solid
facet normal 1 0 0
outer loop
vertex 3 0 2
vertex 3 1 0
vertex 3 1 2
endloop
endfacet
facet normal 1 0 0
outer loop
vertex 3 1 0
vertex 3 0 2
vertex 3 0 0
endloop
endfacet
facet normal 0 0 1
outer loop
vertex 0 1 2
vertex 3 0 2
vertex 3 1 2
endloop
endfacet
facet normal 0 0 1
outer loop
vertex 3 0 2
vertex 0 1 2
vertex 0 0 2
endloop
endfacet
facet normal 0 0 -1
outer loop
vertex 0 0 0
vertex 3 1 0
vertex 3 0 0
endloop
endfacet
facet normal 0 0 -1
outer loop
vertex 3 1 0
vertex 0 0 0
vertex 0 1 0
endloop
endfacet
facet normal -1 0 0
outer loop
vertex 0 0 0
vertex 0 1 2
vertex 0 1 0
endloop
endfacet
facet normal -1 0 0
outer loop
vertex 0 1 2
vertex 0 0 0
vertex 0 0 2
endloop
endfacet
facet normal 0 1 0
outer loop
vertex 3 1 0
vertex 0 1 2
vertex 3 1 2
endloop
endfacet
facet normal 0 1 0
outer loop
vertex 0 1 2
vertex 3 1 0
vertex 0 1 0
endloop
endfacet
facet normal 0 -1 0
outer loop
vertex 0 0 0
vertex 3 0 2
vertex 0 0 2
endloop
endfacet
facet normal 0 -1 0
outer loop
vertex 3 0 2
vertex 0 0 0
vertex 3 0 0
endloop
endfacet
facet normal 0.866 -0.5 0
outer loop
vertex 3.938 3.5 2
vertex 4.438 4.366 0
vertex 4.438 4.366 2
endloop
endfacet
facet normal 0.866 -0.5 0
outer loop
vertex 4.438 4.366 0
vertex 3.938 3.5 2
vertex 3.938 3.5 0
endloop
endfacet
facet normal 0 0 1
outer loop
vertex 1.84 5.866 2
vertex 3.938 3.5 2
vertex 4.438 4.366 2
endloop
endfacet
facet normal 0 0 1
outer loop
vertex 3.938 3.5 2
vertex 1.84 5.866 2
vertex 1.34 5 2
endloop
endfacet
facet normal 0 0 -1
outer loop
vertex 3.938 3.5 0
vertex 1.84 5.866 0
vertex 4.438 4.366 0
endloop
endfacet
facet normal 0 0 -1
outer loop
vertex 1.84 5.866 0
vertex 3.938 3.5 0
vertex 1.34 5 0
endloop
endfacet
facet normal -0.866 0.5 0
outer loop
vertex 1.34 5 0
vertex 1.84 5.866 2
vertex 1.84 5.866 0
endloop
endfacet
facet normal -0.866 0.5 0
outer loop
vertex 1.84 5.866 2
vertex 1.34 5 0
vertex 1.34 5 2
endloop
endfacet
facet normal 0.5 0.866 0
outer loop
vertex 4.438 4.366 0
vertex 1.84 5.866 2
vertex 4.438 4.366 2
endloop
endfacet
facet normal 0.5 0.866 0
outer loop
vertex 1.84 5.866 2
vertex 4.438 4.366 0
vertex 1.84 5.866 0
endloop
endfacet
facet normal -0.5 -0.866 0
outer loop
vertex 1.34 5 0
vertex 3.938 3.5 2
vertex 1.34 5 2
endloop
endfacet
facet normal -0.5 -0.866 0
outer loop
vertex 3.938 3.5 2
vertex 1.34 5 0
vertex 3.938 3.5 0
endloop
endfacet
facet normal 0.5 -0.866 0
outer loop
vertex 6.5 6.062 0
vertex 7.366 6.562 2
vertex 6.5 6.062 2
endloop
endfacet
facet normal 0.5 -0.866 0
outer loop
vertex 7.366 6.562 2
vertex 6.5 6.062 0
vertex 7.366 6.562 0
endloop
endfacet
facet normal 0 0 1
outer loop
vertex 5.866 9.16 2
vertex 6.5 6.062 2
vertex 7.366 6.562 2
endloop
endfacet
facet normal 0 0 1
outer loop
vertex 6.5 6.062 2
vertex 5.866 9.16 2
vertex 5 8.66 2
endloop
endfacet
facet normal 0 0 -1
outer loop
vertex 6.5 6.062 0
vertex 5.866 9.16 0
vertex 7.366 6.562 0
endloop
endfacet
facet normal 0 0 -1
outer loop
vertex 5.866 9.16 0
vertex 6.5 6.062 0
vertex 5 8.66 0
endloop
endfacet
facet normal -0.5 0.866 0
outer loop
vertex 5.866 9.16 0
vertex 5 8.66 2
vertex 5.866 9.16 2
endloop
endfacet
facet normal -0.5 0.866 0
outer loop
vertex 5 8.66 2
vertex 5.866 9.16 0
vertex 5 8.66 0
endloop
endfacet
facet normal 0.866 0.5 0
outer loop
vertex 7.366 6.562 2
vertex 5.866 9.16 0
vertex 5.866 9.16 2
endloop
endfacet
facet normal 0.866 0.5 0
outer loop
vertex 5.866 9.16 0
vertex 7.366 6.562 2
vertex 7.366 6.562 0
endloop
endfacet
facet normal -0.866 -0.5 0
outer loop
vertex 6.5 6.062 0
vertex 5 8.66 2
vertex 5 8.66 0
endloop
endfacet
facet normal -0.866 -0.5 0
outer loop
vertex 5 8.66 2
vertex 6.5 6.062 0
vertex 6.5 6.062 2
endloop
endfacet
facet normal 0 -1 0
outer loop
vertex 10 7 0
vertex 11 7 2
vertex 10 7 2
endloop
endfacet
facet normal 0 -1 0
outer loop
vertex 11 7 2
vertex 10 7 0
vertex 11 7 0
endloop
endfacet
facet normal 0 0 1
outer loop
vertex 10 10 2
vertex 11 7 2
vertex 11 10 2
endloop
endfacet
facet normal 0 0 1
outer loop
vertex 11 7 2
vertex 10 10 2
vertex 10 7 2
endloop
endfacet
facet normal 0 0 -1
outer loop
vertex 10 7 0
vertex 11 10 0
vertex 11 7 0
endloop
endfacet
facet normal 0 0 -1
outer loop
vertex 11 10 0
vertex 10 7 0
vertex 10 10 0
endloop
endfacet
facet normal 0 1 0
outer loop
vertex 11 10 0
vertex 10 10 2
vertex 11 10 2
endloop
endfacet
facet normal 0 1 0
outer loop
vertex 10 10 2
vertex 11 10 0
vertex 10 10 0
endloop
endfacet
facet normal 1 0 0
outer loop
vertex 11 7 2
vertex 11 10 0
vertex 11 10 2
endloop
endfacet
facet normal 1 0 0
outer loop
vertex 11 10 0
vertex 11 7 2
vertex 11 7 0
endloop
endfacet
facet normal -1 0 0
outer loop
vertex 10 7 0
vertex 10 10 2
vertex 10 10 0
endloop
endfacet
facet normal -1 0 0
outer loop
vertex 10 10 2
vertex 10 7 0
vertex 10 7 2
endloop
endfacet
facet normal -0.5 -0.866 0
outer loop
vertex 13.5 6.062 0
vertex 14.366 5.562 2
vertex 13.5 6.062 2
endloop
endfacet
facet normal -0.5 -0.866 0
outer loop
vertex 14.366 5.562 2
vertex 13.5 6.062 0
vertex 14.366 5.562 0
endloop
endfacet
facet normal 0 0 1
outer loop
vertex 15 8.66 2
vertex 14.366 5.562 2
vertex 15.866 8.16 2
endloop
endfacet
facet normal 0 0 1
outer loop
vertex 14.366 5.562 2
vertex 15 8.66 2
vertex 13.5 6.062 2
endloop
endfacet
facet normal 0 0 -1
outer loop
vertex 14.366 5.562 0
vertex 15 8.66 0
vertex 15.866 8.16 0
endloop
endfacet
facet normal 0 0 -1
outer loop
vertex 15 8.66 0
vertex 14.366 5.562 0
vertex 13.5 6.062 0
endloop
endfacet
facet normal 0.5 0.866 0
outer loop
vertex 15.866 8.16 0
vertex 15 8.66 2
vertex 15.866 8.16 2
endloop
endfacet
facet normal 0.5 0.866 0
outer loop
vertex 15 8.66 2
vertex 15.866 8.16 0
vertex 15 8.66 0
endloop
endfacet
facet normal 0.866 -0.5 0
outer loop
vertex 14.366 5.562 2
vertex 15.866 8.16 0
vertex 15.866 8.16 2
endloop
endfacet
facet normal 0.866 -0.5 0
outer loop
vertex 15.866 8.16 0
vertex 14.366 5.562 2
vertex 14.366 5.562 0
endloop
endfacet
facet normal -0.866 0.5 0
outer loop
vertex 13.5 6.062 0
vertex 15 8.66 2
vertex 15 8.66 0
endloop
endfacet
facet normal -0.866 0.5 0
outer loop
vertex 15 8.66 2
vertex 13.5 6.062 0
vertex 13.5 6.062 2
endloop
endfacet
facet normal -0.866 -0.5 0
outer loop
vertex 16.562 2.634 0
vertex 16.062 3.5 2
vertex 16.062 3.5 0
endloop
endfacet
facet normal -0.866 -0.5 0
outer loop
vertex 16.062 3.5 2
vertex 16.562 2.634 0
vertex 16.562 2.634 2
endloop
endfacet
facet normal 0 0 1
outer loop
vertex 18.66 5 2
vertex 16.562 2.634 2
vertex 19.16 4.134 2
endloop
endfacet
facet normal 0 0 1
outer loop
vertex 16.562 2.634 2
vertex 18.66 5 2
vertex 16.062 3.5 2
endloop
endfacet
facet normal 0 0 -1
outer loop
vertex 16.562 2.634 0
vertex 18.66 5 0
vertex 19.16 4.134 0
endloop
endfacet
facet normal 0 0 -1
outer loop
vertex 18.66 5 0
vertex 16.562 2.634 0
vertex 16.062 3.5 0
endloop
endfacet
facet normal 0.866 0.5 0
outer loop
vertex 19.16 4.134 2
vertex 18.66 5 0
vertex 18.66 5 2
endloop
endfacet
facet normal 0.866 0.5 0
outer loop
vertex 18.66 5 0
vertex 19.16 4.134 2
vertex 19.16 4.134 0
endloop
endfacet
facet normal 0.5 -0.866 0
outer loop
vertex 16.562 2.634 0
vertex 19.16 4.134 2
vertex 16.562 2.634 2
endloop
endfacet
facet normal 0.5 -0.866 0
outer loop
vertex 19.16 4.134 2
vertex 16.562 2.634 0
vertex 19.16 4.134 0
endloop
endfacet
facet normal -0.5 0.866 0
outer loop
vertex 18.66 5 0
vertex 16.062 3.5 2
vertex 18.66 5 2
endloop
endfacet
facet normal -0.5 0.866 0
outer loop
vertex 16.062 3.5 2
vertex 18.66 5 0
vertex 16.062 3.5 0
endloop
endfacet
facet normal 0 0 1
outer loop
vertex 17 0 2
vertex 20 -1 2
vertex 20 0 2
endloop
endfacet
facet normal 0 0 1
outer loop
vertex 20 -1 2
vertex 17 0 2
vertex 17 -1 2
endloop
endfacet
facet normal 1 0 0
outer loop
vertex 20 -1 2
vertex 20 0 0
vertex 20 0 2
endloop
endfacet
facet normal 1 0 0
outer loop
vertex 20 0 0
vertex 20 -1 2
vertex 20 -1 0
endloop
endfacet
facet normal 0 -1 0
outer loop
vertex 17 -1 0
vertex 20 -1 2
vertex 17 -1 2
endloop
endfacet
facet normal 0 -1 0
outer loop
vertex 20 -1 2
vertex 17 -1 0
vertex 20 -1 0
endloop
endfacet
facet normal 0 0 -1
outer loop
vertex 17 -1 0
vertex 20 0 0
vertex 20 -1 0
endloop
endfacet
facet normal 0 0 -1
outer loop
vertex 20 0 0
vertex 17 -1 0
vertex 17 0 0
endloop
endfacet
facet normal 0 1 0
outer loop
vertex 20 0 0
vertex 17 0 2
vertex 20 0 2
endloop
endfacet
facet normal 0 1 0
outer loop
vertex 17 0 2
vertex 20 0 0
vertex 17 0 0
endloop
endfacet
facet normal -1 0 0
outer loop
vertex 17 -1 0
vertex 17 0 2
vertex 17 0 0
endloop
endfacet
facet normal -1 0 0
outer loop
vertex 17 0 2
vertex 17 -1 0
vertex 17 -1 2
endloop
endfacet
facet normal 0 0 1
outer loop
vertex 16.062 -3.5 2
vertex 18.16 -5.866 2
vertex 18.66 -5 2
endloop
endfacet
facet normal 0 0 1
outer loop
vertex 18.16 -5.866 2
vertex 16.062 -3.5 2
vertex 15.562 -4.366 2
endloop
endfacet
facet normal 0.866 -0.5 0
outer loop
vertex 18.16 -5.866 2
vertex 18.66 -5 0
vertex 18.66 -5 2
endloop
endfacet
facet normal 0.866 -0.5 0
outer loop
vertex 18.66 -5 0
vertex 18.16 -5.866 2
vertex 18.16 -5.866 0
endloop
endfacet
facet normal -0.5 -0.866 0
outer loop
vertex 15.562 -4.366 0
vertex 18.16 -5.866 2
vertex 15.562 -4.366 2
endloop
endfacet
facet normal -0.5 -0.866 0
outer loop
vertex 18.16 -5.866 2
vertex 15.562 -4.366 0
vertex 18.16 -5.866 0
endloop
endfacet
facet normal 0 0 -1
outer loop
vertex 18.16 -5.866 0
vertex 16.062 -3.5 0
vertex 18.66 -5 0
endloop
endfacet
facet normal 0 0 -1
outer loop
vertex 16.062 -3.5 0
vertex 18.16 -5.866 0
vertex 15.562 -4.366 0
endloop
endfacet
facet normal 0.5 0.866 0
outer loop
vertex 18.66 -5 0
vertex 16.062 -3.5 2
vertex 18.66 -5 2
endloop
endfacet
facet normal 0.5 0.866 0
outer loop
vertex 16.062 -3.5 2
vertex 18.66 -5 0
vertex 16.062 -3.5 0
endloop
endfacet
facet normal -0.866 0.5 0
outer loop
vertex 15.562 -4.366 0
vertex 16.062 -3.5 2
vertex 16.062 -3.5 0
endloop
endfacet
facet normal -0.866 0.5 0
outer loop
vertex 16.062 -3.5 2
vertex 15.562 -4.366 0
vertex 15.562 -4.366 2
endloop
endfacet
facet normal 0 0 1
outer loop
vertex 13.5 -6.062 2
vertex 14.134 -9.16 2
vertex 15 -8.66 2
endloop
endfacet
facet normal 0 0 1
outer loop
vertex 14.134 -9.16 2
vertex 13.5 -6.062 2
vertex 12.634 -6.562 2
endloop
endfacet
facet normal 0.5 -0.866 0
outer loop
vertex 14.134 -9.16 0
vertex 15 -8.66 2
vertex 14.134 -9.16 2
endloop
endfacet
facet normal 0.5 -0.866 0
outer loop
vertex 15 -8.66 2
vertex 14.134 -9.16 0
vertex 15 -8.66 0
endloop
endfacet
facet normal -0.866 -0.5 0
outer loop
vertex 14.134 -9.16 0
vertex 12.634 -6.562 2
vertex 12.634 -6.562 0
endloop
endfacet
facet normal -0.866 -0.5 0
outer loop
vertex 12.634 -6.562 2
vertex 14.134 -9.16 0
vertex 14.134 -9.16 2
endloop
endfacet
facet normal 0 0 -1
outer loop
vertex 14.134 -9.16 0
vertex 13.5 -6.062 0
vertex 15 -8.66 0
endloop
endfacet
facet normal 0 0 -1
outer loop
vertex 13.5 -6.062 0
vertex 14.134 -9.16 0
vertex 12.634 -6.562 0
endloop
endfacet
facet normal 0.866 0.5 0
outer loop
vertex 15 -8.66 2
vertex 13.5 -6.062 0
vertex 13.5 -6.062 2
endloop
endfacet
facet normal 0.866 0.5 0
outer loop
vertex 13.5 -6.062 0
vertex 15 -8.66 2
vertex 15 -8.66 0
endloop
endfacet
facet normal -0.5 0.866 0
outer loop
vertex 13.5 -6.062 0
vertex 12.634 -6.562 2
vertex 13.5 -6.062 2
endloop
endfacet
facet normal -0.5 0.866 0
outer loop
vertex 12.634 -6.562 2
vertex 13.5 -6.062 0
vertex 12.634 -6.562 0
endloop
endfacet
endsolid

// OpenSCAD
/**
 * on_arc.scad
 *
 * Use this module to place a child object along an arc, rotated at the correct angle
 * to maintain association with the arc's focal point.
 *
 * This OpenSCAD library is part of the [dotscad](https://github.com/dotscad/dotscad)
 * project.
 *
 * @copyright  Chris Petersen, 2013
 * @license    http://creativecommons.org/licenses/LGPL/2.1/
 * @license    http://creativecommons.org/licenses/by-sa/3.0/
 *
 * @see        http://www.thingiverse.com/thing:118648
 * @source     https://github.com/dotscad/dotscad/blob/master/on_arc.scad
 *
 * @param float radius Radius of the arc
 * @param float angle  Angle along the arc to place the child object
 */
module on_arc(radius, angle) {
    x = radius - radius * cos(angle);
    y = radius * sin(angle);
    translate([x,y,0])
        rotate([0,0,-angle])
            children();
}

/*
 * When this file is opened directly in OpenSCAD, the following code will render an
 * example of the functions it provides.  This example will *not* render if this module
 * is imported into your own project via the `use` statement.
 */
on_arc_example();
module on_arc_example() {
    union() {
        for(a = [0 : 30 : 260]) {
            on_arc(10, a) cube([3,1,2]);
        }
    }
}
